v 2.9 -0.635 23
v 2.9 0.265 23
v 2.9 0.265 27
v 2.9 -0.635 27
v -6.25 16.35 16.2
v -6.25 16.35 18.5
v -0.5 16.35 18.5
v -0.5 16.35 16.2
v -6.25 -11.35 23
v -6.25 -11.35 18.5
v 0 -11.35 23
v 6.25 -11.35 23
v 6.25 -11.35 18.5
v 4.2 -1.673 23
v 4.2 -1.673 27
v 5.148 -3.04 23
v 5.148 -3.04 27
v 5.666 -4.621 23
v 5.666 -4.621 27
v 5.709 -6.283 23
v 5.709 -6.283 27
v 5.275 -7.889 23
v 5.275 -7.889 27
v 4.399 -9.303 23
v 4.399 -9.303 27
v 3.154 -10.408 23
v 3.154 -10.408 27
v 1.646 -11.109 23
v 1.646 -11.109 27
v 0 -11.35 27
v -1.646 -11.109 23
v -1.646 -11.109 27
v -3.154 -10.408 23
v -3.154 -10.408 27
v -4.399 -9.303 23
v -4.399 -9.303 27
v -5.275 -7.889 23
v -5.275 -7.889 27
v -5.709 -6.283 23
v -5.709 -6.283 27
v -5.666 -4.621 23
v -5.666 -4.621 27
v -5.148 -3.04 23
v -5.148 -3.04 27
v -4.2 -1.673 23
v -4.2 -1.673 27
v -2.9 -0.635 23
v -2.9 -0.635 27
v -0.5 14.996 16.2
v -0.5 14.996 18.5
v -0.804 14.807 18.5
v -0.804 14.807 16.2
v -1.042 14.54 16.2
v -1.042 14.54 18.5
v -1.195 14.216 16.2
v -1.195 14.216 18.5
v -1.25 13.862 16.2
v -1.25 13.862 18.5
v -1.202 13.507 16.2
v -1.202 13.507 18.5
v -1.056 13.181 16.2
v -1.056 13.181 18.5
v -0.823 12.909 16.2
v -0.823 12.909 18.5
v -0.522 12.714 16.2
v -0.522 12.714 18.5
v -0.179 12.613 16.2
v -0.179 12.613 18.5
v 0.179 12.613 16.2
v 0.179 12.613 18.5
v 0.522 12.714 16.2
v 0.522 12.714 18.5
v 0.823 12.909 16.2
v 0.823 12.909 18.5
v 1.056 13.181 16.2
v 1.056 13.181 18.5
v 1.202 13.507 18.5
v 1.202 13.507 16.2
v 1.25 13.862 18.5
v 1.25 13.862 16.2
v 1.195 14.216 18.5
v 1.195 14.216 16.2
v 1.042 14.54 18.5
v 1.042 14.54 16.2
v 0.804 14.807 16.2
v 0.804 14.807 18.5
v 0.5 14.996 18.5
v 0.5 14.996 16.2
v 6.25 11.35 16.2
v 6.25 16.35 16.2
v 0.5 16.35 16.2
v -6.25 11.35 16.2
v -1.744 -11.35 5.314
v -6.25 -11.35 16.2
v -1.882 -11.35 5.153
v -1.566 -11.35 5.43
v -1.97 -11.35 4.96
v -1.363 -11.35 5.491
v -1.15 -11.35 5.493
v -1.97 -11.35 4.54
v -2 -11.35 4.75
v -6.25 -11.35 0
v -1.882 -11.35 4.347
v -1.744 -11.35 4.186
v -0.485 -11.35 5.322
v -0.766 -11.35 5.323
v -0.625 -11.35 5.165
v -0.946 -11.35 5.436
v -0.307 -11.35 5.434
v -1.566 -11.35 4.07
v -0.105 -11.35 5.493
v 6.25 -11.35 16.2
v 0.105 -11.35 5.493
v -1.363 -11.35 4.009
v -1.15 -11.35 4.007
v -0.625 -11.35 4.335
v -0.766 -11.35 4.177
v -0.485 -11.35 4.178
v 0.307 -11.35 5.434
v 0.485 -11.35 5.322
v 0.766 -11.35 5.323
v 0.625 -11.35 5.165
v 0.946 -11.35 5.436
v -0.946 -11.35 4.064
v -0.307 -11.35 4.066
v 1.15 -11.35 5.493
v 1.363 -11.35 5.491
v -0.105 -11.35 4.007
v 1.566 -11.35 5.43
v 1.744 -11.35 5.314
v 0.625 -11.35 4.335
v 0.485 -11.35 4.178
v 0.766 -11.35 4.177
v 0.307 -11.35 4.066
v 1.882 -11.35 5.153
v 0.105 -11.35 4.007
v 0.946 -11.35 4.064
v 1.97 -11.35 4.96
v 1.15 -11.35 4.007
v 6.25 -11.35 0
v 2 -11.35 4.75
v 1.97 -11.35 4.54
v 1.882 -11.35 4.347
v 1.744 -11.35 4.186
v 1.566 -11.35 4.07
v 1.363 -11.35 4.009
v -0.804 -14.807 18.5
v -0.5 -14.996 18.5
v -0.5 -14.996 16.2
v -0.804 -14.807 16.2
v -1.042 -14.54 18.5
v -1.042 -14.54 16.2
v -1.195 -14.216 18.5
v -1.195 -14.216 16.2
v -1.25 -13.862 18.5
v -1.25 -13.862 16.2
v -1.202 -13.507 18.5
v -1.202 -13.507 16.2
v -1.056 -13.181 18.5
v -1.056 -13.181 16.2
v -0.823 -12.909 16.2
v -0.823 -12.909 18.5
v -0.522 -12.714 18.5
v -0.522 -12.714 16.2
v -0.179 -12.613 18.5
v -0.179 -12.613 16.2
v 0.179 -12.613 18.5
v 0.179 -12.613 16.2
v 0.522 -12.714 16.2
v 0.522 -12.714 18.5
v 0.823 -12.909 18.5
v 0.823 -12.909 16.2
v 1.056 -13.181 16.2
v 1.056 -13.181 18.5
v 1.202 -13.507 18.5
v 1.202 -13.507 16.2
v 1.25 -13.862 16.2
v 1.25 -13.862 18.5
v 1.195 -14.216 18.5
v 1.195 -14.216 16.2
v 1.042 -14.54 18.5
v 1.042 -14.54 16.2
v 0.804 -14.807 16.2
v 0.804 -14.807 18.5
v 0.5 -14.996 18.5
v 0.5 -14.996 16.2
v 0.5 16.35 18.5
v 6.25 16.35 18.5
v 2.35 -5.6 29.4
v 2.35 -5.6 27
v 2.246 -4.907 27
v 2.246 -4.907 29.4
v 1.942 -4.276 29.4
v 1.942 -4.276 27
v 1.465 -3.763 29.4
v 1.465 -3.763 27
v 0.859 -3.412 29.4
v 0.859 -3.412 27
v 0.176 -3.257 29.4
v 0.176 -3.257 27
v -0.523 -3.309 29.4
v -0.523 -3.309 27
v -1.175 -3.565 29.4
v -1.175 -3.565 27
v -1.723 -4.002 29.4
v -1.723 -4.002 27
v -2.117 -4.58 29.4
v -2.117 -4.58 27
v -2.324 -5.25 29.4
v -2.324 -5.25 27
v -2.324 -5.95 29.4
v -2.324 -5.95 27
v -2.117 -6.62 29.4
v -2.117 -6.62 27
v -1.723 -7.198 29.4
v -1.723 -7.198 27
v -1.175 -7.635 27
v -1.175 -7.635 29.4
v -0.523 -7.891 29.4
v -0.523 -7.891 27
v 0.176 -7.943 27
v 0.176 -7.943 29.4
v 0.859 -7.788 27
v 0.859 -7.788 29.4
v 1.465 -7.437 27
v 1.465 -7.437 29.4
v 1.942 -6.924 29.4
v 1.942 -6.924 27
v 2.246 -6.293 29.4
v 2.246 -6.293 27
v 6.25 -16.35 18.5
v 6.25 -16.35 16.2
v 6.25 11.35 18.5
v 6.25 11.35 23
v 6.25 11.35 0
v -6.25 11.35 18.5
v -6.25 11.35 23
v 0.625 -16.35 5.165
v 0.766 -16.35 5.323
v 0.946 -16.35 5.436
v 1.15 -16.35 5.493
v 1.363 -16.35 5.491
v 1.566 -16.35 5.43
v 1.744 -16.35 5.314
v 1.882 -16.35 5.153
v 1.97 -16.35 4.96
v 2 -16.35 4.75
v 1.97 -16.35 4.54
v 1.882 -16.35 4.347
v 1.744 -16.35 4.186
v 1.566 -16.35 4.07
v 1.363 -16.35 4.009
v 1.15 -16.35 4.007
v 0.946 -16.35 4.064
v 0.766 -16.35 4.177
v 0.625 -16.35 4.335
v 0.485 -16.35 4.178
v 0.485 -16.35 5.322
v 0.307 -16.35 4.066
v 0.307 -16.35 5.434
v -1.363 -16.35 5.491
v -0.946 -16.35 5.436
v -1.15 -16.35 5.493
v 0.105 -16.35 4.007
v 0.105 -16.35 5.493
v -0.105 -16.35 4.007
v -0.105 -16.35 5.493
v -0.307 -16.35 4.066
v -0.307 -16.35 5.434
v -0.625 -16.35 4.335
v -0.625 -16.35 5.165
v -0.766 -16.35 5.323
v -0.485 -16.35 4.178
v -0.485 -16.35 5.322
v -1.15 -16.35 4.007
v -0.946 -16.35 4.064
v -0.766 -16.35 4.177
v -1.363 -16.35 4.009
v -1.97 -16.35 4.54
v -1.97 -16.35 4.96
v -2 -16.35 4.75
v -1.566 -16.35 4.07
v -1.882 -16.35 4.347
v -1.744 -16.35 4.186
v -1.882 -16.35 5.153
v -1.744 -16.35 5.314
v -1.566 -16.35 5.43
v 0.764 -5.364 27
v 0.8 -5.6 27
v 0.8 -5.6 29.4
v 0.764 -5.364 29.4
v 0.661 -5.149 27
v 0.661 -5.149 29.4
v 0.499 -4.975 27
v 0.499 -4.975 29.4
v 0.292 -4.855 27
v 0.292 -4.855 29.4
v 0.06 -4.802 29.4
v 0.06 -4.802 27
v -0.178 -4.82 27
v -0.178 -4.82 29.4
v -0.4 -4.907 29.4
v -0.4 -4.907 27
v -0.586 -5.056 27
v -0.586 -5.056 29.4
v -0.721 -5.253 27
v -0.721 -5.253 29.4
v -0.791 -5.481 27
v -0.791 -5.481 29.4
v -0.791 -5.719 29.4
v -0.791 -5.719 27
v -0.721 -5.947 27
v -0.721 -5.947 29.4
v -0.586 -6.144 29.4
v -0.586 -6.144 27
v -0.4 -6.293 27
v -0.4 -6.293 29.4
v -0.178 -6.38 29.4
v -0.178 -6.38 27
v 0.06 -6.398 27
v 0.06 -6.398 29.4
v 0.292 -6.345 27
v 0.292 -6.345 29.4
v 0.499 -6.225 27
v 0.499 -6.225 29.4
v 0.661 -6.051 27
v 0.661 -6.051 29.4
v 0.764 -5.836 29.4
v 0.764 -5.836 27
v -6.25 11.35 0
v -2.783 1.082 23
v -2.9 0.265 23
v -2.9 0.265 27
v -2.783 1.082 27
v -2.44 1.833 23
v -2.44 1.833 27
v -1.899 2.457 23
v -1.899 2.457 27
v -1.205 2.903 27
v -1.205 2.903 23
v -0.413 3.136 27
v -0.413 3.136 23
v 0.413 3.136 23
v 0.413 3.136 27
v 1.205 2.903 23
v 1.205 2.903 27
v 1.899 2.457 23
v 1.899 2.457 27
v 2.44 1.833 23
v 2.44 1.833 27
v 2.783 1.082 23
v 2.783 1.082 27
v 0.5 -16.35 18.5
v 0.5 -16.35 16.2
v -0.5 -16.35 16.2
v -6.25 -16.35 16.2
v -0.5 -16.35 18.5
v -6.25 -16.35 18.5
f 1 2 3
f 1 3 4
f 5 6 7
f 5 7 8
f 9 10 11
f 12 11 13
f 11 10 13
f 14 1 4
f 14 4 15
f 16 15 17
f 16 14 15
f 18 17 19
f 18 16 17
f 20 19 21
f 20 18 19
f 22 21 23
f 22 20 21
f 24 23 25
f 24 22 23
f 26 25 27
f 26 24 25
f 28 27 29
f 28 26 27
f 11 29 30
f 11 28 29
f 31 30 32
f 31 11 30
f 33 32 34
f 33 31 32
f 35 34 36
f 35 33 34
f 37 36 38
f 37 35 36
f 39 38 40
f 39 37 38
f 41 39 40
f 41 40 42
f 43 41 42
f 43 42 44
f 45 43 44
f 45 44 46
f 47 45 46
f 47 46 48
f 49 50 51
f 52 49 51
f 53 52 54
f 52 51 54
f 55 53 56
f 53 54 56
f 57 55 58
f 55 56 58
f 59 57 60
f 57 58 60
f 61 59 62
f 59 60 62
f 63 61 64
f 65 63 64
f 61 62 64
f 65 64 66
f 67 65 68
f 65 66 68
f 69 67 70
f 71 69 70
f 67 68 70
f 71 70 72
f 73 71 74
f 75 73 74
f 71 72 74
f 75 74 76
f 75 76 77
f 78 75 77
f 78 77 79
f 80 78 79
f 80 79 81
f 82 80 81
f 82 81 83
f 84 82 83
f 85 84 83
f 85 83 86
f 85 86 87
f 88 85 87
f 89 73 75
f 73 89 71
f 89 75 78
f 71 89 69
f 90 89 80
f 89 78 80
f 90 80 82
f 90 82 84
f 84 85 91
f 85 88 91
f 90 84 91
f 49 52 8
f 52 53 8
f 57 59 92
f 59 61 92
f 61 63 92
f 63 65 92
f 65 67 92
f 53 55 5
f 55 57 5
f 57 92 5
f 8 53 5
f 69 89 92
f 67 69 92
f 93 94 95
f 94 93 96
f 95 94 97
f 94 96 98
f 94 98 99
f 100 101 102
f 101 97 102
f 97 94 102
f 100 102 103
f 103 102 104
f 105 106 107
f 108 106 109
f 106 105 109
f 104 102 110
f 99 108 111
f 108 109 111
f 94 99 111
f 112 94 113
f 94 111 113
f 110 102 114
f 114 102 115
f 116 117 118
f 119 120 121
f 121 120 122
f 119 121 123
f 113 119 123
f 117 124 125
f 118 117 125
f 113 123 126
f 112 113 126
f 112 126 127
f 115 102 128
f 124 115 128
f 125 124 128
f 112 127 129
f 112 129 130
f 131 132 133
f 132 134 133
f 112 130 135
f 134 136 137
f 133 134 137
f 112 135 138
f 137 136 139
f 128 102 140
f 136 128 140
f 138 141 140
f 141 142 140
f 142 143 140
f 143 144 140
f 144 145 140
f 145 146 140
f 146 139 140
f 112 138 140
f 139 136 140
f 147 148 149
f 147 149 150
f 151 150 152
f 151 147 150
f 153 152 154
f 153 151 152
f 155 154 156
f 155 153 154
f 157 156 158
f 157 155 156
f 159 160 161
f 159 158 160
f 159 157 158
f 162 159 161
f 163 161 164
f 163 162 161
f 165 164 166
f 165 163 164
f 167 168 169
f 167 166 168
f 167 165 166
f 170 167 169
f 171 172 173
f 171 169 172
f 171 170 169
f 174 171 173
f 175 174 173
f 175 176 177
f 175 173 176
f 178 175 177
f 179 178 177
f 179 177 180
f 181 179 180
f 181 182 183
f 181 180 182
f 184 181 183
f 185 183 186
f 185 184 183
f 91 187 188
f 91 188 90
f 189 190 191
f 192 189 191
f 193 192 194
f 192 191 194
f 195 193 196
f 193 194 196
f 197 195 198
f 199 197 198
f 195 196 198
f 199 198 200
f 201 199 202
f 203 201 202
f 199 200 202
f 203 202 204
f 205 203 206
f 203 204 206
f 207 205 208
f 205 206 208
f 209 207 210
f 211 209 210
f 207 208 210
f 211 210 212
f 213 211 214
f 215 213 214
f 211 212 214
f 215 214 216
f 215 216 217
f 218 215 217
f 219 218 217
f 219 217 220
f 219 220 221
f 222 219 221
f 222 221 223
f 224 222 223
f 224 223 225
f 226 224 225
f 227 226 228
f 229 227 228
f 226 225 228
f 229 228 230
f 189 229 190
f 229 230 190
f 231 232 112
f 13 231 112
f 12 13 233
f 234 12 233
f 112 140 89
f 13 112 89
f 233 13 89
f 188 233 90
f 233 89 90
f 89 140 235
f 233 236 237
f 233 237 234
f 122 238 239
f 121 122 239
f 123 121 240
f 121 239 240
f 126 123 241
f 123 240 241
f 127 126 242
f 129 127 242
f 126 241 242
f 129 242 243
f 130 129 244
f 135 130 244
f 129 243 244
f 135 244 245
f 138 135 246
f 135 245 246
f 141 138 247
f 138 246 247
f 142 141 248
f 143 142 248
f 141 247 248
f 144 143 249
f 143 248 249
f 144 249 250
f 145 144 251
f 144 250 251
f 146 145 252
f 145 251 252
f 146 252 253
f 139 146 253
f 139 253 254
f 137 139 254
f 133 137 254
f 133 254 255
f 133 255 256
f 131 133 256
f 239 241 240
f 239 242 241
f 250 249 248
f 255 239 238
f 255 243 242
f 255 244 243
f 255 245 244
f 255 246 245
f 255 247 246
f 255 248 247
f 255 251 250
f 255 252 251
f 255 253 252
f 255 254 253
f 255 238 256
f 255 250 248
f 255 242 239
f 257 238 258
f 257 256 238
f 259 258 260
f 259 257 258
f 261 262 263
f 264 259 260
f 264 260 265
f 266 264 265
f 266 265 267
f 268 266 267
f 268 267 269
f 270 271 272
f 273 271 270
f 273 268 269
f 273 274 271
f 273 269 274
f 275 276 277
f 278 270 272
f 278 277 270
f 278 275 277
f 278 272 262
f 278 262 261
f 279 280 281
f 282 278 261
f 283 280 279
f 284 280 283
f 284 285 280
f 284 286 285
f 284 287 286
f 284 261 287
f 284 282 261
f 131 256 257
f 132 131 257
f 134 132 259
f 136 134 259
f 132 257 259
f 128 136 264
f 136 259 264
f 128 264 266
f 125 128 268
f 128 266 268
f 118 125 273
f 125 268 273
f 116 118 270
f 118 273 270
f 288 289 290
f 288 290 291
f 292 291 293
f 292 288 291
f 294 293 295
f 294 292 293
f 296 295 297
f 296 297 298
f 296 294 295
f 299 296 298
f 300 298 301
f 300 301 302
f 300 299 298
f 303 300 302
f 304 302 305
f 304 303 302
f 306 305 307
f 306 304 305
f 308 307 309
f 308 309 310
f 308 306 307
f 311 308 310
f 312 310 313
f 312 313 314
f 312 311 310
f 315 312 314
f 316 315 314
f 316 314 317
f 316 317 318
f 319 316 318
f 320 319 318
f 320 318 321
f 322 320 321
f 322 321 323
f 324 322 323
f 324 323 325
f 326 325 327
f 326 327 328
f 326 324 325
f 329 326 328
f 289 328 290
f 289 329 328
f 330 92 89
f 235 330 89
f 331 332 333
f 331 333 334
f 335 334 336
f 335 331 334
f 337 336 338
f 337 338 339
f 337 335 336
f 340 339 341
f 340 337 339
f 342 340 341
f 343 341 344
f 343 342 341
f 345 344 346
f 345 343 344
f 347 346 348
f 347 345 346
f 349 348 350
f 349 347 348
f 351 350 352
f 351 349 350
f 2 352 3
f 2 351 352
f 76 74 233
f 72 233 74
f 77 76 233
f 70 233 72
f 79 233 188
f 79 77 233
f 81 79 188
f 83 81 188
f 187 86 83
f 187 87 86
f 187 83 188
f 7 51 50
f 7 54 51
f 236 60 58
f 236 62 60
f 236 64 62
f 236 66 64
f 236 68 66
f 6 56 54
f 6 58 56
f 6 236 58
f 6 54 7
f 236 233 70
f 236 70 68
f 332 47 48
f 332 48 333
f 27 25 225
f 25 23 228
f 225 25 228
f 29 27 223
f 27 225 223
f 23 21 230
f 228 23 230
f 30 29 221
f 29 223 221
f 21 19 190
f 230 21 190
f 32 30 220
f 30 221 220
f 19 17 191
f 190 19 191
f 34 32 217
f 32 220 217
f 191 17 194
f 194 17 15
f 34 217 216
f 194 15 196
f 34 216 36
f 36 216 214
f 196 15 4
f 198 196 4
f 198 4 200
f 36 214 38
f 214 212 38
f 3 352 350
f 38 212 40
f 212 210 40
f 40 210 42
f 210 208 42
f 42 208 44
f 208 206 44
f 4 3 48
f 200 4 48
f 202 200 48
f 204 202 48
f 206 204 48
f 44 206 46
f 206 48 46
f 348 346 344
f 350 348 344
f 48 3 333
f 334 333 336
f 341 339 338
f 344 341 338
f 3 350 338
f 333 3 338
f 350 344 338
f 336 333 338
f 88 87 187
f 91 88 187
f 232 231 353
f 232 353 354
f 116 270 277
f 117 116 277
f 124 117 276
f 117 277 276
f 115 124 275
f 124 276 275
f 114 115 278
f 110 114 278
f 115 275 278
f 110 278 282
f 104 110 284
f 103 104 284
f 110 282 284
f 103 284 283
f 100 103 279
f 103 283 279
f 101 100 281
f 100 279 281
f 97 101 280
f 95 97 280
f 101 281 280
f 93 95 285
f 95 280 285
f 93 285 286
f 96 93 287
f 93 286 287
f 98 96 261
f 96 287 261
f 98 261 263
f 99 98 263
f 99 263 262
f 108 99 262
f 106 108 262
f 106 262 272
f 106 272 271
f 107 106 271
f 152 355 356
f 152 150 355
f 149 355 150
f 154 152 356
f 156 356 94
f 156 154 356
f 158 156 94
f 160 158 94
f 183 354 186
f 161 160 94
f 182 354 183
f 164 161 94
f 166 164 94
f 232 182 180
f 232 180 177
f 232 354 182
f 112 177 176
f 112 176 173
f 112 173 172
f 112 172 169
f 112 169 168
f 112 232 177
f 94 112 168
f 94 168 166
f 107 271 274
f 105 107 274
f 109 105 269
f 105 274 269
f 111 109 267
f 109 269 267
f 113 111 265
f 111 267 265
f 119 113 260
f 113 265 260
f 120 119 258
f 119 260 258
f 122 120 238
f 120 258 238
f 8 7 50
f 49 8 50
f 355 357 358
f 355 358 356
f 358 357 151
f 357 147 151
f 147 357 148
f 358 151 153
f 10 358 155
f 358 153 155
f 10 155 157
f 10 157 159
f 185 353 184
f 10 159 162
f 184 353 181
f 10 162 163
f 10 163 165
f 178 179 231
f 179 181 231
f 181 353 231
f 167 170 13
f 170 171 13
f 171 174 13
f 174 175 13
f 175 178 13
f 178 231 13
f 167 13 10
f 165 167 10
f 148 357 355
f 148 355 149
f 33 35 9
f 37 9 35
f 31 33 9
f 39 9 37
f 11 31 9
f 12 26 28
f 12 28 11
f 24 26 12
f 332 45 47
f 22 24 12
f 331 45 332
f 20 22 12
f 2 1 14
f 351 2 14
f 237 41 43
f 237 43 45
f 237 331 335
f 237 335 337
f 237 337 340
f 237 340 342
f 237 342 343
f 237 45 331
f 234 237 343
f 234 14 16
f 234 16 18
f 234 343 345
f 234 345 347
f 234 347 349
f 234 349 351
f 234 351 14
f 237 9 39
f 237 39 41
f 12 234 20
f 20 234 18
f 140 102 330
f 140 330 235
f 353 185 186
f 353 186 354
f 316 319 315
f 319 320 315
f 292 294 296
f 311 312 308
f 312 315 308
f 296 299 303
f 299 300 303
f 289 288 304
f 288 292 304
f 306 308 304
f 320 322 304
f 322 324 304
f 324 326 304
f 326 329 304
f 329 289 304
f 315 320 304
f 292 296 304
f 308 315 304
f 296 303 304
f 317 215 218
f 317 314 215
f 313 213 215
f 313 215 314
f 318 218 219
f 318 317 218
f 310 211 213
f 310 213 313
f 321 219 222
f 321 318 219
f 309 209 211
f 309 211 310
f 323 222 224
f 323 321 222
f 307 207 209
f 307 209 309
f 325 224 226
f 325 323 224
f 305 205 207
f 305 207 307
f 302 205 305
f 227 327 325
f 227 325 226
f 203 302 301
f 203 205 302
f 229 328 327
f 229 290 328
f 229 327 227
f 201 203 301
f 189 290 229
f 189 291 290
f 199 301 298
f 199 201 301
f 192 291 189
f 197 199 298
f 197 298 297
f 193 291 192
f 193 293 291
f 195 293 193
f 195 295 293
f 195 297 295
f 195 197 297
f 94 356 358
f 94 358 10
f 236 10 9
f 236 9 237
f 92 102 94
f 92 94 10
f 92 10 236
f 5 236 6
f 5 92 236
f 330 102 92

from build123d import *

# Parameters (mm, degrees)
SKETCH1_W           = 12.5
SKETCH1_H           = 22.7
BOSS_EXTRUDE1_DEPTH = 23
BOSS_EXTRUDE2_DEPTH = 4
SKETCH3_W           = 2.3
SKETCH3_H           = 5
BOSS_EXTRUDE3_DEPTH = 6.25
CUT_EXTRUDE1_REACH  = 20.5
BOSS_EXTRUDE4_START = -4
SKETCH5_W           = 4
SKETCH5_H           = 5
BOSS_EXTRUDE4_DEPTH = 1.5
SKETCH6_R           = 2.35
SKETCH6_R_2         = 0.8
BOSS_EXTRUDE5_DEPTH = 2.4
SKETCH7_W           = 4.514706964
SKETCH7_H           = 2.103718672
CUT_EXTRUDE2_DEPTH  = 5


with BuildPart() as part:
    # Sketch1 → Boss-Extrude1 (new body)
    with BuildSketch(Plane.XY):
        Rectangle(SKETCH1_W, SKETCH1_H)
    extrude(amount=BOSS_EXTRUDE1_DEPTH)

    # Sketch2 → Boss-Extrude2 (add)
    with BuildSketch(Plane.XY.offset(23)):
        with BuildLine():
            Line((2.9, 0.265128397), (2.9, -0.634871603))
            ThreePointArc((2.9, -0.634871603), (0, -11.35), (-2.9, -0.634871603))
            Line((-2.9, -0.634871603), (-2.9, 0.265128397))
            ThreePointArc((-2.9, 0.265128397), (0, 3.165128397), (2.9, 0.265128397))
        make_face()
    extrude(amount=BOSS_EXTRUDE2_DEPTH)

    # Sketch3 → Boss-Extrude3 (add, symmetric)
    with BuildSketch(Plane(origin=(0, 0, 0), x_dir=(0, 0, -1), z_dir=(1, 0, 0))):
        with Locations((-17.35, 13.85)):
            Rectangle(SKETCH3_W, SKETCH3_H)
        with Locations((-17.35, -13.85)):
            Rectangle(SKETCH3_W, SKETCH3_H)
    extrude(amount=BOSS_EXTRUDE3_DEPTH, both=True)

    # Sketch4 → Cut-Extrude1 (cut, up to next)
    with BuildSketch(Plane.XY.offset(18.5), mode=Mode.PRIVATE) as cut_extrude1_sk1:
        with BuildLine():
            Line((0.5, 16.35), (-0.5, 16.35))
            Line((-0.5, 16.35), (-0.5, 14.995643924))
            ThreePointArc((-0.5, 14.995643924), (0, 12.6), (0.5, 14.995643924))
            Line((0.5, 14.995643924), (0.5, 16.35))
        make_face()
    cut_extrude1_tool1 = extrude(cut_extrude1_sk1.sketch, amount=-CUT_EXTRUDE1_REACH, mode=Mode.PRIVATE) & part.part
    add(cut_extrude1_tool1.solids().sort_by_distance((0, 14.235184, 18.5))[0], mode=Mode.SUBTRACT)
    # Sketch4 → Cut-Extrude1 (cut, up to next)
    with BuildSketch(Plane.XY.offset(18.5), mode=Mode.PRIVATE) as cut_extrude1_sk2:
        with BuildLine():
            Line((-0.5, -16.35), (-0.5, -14.995643924))
            ThreePointArc((-0.5, -14.995643924), (0, -12.6), (0.5, -14.995643924))
            Line((0.5, -14.995643924), (0.5, -16.35))
            Line((0.5, -16.35), (-0.5, -16.35))
        make_face()
    cut_extrude1_tool2 = extrude(cut_extrude1_sk2.sketch, amount=-CUT_EXTRUDE1_REACH, mode=Mode.PRIVATE) & part.part
    add(cut_extrude1_tool2.solids().sort_by_distance((0, -14.235184, 18.5))[0], mode=Mode.SUBTRACT)

    # Sketch5 → Boss-Extrude4 (add)
    with BuildSketch(Plane(origin=(0, 0, 0), x_dir=(-1, 0, 0), z_dir=(0, 0, -1)).offset(BOSS_EXTRUDE4_START)):
        with Locations((0, -13.85)):
            Rectangle(SKETCH5_W, SKETCH5_H)
    extrude(amount=-BOSS_EXTRUDE4_DEPTH)

    # Sketch6 → Boss-Extrude5 (add)
    with BuildSketch(Plane.XY.offset(27)):
        with Locations((0, -5.6)):
            Circle(SKETCH6_R)
        with Locations((0, -5.6)):
            Circle(SKETCH6_R_2, mode=Mode.SUBTRACT)
    extrude(amount=BOSS_EXTRUDE5_DEPTH)

    # Sketch7 → Cut-Extrude2 (cut)
    with BuildSketch(Plane.XZ.offset(16.35)):
        with Locations((0, 4.75)):
            Rectangle(SKETCH7_W, SKETCH7_H)
        with BuildLine():
            ThreePointArc((-0.625, 4.335421901), (-2, 4.75), (-0.625, 5.164578099))
            ThreePointArc((-0.625, 5.164578099), (0, 5.5), (0.625, 5.164578099))
            ThreePointArc((0.625, 5.164578099), (2, 4.75), (0.625, 4.335421901))
            ThreePointArc((0.625, 4.335421901), (0, 4), (-0.625, 4.335421901))
        make_face(mode=Mode.SUBTRACT)
    extrude(amount=-CUT_EXTRUDE2_DEPTH, mode=Mode.SUBTRACT)


solid = part.part
